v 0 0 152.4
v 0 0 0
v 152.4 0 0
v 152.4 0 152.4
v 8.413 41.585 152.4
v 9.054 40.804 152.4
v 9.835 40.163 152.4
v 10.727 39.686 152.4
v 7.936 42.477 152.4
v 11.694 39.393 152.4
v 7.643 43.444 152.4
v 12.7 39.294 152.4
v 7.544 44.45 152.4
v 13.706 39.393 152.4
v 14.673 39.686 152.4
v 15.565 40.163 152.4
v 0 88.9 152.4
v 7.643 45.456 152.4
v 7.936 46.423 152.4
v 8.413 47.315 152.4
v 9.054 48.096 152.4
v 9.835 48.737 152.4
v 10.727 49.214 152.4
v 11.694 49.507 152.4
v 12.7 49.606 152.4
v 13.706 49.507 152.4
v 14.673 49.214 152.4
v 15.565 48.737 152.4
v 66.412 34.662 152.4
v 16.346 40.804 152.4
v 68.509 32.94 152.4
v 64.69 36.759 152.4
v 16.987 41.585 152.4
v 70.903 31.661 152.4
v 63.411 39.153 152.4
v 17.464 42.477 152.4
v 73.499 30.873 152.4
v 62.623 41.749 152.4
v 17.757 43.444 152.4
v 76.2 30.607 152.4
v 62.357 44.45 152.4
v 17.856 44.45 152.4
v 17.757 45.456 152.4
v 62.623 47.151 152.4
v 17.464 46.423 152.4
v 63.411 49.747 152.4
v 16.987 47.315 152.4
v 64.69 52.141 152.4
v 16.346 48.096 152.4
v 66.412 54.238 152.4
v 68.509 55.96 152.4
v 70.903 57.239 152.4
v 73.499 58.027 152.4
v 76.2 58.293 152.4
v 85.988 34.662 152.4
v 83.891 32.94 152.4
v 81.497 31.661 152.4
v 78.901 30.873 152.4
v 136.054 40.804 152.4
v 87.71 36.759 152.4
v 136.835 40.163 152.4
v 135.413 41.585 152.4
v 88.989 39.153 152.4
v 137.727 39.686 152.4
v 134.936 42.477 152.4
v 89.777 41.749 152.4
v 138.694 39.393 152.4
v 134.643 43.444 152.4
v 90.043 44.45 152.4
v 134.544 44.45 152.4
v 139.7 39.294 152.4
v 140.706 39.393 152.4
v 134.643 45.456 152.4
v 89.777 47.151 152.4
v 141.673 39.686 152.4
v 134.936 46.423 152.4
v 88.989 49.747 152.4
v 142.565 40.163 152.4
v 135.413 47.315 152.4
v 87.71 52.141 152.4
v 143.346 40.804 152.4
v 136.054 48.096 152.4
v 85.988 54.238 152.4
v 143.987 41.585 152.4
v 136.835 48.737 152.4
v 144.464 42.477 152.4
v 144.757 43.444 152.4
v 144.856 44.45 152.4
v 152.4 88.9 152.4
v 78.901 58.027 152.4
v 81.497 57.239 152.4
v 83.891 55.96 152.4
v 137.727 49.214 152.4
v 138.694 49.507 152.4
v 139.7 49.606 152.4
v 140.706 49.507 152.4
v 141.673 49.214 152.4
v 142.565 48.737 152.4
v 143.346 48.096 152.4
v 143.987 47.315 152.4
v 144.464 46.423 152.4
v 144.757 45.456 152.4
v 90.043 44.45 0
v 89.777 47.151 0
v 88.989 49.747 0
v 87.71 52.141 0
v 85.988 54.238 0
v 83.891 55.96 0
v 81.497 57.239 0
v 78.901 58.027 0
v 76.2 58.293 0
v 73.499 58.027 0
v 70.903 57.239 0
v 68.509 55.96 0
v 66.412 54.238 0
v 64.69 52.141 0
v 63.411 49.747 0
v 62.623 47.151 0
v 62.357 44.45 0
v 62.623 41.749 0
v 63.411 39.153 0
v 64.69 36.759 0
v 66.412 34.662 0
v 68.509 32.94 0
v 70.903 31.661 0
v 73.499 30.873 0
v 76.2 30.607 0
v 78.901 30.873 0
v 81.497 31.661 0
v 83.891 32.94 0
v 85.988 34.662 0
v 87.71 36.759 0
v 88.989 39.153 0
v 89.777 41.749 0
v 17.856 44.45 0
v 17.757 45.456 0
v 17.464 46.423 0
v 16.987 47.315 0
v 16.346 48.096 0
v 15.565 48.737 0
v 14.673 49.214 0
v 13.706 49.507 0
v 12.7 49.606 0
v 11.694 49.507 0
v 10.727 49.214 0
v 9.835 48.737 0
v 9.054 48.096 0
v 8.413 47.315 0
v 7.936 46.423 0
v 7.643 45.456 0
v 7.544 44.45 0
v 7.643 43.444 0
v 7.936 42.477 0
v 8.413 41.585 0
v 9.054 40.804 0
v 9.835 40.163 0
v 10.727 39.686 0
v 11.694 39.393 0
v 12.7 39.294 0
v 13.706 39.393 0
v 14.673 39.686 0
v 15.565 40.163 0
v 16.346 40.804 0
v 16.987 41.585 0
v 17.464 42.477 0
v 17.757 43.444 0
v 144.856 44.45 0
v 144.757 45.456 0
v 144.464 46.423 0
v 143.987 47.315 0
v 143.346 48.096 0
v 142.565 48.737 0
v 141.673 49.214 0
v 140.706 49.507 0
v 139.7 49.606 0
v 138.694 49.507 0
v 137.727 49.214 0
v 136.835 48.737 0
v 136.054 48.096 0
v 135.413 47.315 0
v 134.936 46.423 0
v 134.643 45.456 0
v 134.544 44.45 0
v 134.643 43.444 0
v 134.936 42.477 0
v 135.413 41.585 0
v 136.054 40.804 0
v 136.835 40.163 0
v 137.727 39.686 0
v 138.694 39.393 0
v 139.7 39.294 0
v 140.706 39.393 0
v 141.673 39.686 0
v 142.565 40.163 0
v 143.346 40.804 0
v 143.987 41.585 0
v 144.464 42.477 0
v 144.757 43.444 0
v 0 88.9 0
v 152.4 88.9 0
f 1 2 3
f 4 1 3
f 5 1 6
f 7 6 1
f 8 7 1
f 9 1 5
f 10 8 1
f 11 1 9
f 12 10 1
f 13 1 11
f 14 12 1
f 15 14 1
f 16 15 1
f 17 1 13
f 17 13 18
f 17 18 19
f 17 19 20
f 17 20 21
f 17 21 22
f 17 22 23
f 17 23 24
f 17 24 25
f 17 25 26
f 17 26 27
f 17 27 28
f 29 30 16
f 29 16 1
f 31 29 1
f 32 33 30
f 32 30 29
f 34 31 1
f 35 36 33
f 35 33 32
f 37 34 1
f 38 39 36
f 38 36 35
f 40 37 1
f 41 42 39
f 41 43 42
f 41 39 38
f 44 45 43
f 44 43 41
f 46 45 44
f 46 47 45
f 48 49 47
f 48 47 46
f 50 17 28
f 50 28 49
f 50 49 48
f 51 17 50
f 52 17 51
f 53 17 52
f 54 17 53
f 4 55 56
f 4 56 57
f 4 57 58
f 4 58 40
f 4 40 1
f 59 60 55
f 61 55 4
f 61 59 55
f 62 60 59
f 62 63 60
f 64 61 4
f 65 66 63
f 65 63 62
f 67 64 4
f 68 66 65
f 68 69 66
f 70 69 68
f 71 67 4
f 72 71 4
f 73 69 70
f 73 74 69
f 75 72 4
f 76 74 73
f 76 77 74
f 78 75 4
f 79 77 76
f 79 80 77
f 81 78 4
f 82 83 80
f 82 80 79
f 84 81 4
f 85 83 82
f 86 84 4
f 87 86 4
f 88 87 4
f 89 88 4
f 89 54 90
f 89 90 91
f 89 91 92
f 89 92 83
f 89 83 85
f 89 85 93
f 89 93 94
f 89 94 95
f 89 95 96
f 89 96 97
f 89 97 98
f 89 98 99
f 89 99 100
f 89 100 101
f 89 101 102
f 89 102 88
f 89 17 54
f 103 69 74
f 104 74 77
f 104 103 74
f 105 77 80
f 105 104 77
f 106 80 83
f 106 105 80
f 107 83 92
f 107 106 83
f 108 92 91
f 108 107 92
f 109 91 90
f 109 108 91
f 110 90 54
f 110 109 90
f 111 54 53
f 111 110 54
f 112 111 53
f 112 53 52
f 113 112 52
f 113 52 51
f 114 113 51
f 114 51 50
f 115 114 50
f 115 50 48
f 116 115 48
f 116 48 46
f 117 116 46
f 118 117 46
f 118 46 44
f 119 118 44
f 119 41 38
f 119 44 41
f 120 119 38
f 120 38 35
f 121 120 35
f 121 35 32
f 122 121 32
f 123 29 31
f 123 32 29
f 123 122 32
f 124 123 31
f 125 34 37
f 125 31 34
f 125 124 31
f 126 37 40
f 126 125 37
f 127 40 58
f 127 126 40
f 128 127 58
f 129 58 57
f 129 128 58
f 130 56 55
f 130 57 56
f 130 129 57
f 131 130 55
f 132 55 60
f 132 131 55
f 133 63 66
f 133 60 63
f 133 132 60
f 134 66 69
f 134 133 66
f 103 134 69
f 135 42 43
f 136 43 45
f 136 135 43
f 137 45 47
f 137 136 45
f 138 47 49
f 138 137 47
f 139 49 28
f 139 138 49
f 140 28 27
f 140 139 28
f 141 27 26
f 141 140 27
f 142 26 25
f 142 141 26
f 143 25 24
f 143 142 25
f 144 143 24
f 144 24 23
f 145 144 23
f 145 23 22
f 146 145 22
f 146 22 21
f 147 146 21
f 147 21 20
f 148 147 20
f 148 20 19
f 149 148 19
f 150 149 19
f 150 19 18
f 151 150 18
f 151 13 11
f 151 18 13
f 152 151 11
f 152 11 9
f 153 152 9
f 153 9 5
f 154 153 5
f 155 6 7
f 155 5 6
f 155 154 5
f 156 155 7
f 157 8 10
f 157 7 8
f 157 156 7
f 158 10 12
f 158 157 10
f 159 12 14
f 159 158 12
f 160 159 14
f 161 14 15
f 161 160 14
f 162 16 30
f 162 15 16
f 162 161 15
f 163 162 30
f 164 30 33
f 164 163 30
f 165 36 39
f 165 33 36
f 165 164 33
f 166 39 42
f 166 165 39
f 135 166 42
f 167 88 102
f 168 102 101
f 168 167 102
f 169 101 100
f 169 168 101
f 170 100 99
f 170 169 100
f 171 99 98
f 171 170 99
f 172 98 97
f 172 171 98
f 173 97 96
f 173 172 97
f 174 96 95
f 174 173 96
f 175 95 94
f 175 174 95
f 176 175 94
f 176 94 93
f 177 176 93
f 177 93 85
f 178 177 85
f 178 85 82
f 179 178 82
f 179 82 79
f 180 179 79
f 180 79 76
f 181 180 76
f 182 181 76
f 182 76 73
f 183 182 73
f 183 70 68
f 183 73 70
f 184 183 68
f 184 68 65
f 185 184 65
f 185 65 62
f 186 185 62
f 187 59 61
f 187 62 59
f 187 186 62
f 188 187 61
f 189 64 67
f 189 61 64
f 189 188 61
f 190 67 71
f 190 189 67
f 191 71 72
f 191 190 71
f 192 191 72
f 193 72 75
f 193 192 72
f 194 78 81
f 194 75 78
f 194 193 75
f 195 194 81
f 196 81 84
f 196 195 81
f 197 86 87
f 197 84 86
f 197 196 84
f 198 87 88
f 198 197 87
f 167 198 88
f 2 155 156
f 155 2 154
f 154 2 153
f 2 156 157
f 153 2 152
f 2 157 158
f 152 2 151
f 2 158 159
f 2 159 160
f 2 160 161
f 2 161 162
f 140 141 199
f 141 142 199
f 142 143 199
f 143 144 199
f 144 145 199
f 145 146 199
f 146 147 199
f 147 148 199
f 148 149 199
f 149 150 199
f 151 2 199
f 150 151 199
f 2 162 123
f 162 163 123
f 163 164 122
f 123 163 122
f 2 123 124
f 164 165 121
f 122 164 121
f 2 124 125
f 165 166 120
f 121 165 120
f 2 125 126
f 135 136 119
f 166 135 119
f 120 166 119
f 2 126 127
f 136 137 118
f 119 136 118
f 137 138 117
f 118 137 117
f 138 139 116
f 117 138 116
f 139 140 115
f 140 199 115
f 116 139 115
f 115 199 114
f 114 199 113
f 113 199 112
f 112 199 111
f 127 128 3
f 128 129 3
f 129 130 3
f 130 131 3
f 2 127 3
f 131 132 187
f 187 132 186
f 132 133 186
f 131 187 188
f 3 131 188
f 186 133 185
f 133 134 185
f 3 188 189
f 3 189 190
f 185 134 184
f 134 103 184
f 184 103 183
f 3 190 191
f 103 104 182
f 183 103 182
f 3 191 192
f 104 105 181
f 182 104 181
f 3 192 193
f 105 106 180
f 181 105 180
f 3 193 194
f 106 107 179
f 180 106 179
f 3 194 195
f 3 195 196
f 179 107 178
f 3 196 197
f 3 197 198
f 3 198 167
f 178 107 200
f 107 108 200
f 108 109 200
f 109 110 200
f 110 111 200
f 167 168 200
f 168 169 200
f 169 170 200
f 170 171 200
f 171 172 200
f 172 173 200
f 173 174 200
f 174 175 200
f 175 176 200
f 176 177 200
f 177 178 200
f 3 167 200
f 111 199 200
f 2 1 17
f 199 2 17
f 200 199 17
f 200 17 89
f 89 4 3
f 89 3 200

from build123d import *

# Parameters (mm, degrees)
SKETCH1_W           = 152.4
SKETCH1_H           = 88.9
BOSS_EXTRUDE1_DEPTH = 152.4
SKETCH2_R           = 13.843
CUT_EXTRUDE1_DEPTH  = 234.141008834
SKETCH3_R           = 5.1562
CUT_EXTRUDE2_DEPTH  = 234.141008834


with BuildPart() as part:
    # Sketch1 → Boss-Extrude1 (new body)
    with BuildSketch(Plane.XY):
        with Locations((76.2, 44.45)):
            Rectangle(SKETCH1_W, SKETCH1_H)
    extrude(amount=BOSS_EXTRUDE1_DEPTH)

    # Sketch2 → Cut-Extrude1 (cut, through all)
    with BuildSketch(Plane.XY):
        with Locations((76.2, 44.45)):
            Circle(SKETCH2_R)
    extrude(amount=CUT_EXTRUDE1_DEPTH, mode=Mode.SUBTRACT)

    # Sketch3 → Cut-Extrude2 (cut, through all)
    with BuildSketch(Plane.XY):
        with Locations((12.7, 44.45)):
            Circle(SKETCH3_R)
        with Locations((139.7, 44.45)):
            Circle(SKETCH3_R)
    extrude(amount=CUT_EXTRUDE2_DEPTH, mode=Mode.SUBTRACT)


solid = part.part
